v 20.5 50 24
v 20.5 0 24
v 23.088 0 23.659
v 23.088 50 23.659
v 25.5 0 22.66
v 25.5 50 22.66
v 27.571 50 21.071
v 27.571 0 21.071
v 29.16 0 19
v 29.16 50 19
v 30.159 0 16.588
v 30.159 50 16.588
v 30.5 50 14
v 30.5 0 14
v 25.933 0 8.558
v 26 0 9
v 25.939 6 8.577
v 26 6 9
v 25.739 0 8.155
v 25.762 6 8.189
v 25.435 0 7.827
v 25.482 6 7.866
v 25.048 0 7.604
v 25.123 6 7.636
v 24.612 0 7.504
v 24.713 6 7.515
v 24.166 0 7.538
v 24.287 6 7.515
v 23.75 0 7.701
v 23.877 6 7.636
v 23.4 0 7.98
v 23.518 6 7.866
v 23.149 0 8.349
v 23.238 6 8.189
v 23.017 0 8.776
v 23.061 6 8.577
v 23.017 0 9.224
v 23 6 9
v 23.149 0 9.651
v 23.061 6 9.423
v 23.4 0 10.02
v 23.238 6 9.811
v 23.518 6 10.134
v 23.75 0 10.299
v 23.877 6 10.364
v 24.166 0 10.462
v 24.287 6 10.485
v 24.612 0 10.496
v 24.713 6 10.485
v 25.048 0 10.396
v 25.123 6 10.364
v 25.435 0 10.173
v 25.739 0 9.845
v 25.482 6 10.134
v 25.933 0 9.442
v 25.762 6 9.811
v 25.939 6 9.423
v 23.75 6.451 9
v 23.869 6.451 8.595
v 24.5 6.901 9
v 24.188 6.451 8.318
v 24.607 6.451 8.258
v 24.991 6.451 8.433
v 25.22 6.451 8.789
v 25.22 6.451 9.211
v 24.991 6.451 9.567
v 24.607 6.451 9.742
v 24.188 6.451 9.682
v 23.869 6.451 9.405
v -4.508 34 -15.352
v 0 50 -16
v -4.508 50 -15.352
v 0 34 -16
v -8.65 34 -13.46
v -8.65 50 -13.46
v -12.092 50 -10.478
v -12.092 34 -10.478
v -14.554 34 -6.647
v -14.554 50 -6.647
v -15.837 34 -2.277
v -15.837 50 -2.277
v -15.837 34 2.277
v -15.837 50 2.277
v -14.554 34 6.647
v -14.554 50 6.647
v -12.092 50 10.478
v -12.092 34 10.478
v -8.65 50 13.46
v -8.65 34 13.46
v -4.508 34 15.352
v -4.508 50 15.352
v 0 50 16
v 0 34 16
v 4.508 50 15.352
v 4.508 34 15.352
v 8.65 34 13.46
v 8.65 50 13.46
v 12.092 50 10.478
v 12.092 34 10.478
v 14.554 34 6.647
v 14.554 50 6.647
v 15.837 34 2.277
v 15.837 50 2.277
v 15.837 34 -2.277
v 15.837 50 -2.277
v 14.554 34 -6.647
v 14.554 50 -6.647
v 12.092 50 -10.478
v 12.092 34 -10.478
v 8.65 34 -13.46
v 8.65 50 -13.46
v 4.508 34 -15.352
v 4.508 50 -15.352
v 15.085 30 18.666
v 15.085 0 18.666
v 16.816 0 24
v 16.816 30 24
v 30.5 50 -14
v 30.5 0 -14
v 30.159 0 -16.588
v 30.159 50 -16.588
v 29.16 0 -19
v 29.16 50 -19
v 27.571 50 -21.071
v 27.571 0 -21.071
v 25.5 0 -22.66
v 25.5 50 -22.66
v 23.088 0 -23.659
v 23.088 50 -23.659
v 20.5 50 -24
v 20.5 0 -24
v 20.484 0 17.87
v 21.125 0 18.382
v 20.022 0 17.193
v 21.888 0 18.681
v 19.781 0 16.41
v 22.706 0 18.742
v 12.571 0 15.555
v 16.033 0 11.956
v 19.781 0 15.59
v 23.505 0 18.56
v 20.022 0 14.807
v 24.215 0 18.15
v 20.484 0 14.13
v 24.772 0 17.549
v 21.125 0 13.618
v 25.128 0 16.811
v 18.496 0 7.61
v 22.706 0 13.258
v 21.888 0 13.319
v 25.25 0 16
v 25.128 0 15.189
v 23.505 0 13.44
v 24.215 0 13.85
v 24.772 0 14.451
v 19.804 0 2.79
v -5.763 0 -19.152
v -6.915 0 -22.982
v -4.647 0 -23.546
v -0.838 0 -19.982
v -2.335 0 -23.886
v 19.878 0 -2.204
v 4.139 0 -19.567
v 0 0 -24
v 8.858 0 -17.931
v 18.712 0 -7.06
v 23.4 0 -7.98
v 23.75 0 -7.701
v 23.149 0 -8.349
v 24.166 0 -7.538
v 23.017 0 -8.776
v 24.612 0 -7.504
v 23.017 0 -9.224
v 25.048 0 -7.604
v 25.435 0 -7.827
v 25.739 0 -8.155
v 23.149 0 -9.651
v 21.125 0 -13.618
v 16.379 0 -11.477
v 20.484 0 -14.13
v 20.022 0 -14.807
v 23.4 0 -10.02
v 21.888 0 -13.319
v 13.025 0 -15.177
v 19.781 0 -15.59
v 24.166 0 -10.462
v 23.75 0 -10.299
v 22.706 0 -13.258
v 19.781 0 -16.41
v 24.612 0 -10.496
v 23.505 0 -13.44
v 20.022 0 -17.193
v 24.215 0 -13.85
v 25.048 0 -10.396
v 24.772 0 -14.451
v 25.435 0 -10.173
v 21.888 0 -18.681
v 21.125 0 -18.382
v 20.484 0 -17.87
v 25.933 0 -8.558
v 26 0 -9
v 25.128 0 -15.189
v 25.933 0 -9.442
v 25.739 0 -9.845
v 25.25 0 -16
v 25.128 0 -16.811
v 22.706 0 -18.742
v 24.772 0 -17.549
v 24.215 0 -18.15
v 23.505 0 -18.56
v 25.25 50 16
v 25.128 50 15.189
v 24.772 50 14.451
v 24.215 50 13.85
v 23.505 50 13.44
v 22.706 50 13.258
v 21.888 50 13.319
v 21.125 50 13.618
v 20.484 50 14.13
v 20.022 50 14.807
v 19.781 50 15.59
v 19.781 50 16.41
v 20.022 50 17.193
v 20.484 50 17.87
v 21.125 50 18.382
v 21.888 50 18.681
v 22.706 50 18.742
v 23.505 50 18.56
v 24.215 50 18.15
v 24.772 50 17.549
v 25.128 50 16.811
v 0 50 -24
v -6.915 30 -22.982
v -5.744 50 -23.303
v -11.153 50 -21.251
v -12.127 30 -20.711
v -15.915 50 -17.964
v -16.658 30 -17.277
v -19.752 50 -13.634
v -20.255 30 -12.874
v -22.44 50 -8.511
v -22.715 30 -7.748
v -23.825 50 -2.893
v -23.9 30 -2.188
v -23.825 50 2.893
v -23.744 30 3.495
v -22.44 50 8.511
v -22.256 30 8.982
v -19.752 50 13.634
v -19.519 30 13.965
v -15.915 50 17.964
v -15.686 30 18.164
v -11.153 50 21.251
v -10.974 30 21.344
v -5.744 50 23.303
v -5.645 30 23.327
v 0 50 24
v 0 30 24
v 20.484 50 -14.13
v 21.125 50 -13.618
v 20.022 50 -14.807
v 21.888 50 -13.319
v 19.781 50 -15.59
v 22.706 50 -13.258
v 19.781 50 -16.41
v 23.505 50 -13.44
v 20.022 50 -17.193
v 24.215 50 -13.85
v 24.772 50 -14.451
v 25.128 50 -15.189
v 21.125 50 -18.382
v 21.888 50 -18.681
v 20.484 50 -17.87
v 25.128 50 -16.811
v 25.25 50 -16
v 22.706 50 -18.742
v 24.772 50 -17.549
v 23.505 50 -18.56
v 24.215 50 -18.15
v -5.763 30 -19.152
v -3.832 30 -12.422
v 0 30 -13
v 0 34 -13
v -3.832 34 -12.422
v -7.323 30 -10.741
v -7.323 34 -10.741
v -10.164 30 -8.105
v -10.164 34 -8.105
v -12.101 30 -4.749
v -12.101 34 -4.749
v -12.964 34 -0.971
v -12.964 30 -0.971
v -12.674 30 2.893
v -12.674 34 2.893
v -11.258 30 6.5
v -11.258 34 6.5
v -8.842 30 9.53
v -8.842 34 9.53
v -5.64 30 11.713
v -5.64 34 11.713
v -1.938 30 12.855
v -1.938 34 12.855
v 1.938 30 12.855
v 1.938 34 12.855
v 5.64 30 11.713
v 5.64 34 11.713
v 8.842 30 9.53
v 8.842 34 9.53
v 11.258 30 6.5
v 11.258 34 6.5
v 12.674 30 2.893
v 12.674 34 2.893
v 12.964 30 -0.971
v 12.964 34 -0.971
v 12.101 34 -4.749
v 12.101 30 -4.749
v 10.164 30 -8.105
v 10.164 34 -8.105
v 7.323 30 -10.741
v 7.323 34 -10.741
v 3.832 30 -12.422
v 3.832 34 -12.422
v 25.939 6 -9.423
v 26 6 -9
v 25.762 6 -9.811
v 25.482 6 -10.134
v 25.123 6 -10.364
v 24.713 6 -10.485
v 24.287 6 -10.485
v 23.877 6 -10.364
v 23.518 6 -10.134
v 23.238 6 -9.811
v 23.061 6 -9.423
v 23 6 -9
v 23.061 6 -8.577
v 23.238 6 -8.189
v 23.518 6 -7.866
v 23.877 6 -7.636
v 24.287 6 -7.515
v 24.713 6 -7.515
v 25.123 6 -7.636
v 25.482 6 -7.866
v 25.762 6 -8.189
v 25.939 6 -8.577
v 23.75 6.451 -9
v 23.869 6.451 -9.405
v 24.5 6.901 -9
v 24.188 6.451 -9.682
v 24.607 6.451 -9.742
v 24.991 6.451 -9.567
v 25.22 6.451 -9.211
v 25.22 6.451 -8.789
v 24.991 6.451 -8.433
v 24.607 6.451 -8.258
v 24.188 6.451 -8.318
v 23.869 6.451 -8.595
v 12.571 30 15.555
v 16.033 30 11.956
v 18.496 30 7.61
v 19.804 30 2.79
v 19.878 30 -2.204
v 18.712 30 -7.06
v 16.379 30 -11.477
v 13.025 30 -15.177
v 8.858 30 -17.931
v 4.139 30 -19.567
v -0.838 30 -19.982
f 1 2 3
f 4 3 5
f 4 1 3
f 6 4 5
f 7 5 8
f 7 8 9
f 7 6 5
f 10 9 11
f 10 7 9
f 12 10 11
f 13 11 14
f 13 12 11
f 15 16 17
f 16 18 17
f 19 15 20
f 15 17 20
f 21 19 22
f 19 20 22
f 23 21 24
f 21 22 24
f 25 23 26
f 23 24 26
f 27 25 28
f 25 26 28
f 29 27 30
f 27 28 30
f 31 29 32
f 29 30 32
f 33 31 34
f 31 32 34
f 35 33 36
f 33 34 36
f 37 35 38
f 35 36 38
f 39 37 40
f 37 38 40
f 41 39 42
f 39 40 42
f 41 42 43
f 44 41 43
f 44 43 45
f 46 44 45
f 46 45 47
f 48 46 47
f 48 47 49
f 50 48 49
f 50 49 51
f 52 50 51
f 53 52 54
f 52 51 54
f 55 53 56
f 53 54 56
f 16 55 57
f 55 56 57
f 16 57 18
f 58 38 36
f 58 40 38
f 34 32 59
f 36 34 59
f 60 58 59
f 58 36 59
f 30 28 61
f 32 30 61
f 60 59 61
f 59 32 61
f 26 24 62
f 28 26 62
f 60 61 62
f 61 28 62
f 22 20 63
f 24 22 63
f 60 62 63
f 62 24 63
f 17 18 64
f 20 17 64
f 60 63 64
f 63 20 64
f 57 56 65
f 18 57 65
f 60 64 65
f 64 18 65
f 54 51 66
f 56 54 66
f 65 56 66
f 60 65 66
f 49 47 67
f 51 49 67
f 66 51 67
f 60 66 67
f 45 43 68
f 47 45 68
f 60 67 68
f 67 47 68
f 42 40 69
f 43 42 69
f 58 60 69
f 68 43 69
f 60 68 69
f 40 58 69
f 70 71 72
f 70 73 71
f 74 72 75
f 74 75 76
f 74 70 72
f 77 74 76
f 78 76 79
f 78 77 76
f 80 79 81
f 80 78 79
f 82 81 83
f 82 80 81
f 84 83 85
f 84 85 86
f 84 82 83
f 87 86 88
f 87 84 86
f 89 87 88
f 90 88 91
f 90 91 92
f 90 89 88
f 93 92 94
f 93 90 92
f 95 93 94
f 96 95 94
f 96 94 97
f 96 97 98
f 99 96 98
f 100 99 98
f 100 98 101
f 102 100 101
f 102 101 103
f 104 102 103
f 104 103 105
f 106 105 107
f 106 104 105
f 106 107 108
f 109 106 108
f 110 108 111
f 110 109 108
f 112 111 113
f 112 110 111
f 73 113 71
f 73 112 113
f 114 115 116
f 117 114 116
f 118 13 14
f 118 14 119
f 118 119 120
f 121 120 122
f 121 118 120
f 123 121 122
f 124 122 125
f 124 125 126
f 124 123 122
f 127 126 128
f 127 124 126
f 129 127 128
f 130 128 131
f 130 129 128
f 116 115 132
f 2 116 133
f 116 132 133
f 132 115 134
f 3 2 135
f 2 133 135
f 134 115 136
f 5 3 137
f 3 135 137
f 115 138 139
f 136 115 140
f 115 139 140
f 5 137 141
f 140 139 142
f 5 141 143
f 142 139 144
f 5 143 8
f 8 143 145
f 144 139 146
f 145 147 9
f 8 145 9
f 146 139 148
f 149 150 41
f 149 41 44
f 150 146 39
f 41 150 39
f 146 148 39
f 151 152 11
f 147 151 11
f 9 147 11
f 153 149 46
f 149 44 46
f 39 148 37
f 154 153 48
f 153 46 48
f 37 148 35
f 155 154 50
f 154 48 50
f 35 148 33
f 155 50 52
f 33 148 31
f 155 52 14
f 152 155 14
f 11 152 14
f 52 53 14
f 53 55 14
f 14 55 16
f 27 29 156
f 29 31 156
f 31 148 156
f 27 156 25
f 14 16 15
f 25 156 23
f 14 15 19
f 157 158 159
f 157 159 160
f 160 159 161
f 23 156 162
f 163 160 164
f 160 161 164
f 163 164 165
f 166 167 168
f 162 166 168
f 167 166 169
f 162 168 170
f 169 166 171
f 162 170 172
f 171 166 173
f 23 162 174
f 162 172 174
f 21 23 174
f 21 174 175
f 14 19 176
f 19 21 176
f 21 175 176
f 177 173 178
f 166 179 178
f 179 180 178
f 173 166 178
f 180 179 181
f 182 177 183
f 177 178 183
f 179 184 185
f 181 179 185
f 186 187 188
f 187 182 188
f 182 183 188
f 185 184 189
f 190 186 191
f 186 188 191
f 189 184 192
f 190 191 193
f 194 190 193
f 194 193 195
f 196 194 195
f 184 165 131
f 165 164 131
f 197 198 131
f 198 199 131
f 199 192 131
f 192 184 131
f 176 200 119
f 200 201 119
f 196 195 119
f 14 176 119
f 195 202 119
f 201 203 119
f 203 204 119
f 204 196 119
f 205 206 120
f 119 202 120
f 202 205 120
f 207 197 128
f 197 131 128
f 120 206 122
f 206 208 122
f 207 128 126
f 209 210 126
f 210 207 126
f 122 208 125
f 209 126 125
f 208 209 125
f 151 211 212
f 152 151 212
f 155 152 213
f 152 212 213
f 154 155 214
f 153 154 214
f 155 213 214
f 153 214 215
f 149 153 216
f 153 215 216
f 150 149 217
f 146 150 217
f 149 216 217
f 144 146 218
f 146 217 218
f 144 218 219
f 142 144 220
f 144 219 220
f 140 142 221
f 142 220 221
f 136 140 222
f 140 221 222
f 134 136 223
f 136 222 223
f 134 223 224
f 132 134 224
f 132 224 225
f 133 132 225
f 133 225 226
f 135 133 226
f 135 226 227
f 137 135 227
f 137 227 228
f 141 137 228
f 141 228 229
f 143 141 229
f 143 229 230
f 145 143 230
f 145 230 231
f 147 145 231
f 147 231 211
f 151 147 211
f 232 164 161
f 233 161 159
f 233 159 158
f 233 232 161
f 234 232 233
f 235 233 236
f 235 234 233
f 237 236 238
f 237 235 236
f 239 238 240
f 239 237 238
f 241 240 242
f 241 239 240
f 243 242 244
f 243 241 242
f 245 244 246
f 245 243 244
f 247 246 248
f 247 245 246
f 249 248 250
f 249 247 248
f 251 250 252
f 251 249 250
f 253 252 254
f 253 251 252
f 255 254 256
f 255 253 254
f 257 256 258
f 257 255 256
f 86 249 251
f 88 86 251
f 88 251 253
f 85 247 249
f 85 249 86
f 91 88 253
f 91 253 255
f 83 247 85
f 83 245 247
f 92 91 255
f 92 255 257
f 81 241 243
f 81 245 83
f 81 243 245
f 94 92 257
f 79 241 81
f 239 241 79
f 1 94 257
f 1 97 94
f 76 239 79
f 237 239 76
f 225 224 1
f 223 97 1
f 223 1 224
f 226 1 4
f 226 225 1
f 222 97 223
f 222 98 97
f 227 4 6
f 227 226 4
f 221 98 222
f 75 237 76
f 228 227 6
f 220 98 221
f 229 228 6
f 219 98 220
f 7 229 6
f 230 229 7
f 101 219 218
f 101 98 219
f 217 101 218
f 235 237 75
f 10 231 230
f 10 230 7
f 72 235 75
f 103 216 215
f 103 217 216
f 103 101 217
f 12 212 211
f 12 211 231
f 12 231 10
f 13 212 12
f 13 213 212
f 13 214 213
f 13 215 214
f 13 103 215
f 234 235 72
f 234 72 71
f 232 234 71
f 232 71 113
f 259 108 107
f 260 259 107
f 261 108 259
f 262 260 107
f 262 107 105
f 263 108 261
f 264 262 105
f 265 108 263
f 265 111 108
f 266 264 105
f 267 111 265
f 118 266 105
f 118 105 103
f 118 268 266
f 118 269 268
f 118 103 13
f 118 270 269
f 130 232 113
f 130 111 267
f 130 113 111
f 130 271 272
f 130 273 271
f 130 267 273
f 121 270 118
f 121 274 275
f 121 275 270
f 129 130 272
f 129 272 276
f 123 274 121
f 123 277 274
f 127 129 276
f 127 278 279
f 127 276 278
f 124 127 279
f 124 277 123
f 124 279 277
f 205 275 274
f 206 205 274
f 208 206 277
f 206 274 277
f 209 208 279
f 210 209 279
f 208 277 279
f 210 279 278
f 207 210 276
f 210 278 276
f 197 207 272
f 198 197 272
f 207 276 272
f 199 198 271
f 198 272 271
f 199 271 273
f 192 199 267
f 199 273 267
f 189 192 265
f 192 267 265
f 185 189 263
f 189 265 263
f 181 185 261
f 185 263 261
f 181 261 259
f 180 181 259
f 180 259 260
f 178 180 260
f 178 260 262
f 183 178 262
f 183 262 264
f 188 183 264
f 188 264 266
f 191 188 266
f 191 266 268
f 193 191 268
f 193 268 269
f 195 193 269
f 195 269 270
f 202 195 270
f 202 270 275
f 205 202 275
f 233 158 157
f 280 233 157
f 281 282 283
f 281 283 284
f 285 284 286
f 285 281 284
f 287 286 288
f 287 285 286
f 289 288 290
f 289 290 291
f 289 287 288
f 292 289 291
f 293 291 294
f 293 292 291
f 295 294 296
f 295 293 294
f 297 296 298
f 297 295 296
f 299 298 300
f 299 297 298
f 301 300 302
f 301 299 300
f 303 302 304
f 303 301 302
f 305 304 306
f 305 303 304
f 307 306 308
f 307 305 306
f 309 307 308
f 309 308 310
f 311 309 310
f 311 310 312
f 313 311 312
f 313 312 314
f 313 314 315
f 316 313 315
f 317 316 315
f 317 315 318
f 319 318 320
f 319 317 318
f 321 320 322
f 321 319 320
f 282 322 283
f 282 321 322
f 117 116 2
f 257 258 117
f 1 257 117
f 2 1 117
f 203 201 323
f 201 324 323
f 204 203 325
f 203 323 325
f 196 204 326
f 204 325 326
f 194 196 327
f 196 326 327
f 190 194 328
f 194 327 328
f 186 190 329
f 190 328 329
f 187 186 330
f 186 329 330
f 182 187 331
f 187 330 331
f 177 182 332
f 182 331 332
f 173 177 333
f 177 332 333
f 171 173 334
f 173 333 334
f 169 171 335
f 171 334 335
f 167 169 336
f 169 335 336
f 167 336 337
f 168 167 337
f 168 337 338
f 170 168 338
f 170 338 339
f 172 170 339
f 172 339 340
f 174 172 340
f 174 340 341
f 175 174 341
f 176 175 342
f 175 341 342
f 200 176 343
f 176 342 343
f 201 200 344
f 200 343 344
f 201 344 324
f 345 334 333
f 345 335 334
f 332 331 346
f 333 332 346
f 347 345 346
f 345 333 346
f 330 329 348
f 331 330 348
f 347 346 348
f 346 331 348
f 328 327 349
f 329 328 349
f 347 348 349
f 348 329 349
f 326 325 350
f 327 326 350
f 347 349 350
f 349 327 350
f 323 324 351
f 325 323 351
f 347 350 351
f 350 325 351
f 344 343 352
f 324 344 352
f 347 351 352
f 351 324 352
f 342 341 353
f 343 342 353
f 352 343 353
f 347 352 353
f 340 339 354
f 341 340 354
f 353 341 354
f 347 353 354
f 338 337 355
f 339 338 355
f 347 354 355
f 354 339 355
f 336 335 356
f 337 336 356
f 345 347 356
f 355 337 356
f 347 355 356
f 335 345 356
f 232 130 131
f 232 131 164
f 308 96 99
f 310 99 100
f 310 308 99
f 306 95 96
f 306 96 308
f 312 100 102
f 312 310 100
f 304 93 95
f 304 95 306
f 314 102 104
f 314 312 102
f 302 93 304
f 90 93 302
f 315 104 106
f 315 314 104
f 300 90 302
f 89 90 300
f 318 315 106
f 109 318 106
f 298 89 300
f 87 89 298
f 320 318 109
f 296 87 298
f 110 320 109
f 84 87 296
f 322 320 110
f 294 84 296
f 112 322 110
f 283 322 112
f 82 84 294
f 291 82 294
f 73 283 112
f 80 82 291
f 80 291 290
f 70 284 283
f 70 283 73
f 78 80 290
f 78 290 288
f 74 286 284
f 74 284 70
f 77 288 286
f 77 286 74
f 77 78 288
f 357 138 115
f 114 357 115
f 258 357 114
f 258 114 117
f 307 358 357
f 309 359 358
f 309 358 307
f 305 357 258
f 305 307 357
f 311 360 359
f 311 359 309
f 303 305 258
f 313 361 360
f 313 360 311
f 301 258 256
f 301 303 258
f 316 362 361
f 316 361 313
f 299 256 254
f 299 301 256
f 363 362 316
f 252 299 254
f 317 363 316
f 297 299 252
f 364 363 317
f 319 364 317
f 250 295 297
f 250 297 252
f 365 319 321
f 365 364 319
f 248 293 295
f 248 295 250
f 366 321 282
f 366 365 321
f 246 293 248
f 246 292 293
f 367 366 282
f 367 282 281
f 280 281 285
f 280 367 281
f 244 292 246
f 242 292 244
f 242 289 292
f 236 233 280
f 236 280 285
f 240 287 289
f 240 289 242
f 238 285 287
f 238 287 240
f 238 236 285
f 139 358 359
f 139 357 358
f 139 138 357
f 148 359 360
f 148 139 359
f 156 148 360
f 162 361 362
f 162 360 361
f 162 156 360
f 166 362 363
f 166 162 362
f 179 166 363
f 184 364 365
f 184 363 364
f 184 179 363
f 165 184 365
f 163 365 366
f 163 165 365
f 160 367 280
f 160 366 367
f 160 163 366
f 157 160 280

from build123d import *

# Parameters (mm, degrees)
BOSS_EXTRUDE1_DEPTH       = 50
CUT_EXTRUDE1_DEPTH        = 30
F_3_0MM_DOWEL_HOLE1_D     = 3
F_3_0MM_DOWEL_HOLE1_DEPTH = 6
F_3_0MM_DOWEL_HOLE1_TIP   = 0.901290929
M5_CLEARANCE_HOLE1_D      = 5.5


with BuildPart() as part:
    # Sketch1 → Revolve1 (revolve)
    with BuildSketch(Plane.XY, mode=Mode.PRIVATE) as revolve1_sk:
        Polygon((-24, 0), (-24, 50), (-16, 50), (-16, 34), (-13, 34), (-13, 30), (-16, 30), (-20, 30), (-20, 0), align=None)
    revolve(revolve1_sk.sketch.rotate(Axis((0, 0, 0), (0, 1, 0)), 270), axis=Axis((0, 0, 0), (0, 1, 0)))

    # Sketch6 → Boss-Extrude1 (add)
    with BuildSketch(Plane(origin=(0, 50, 0), x_dir=(1, 0, 0), z_dir=(0, 1, 0))):
        with BuildLine():
            Line((0, -24), (20.5, -24))
            ThreePointArc((20.5, -24), (27.571067812, -21.071067812), (30.5, -14))
            Line((30.5, -14), (30.5, 14))
            ThreePointArc((30.5, 14), (27.571067812, 21.071067812), (20.5, 24))
            Line((20.5, 24), (0, 24))
            ThreePointArc((0, 24), (24, 0), (0, -24))
        make_face()
    extrude(amount=-BOSS_EXTRUDE1_DEPTH)

    # Sketch5 → Cut-Extrude1 (cut)
    with BuildSketch(Plane(origin=(0, 0, 0), x_dir=(1, 0, 0), z_dir=(0, 1, 0))):
        Polygon((15.085272612, -18.666401641), (20.483393436, -35.301209276), (-37.381072525, -18.770693037), (-37.381072525, 22.982117566), (-6.915364934, 22.982117566), (0, 0), align=None)
    extrude(amount=CUT_EXTRUDE1_DEPTH, mode=Mode.SUBTRACT)

    # Ø3.0mm Dowel Hole1
    with Locations(Plane(origin=(0, 0, 0), x_dir=(-1, 0, 0), z_dir=(0, -1, 0))):
        with Locations((-24.5, -9), (-24.5, 9)):
            Hole(F_3_0MM_DOWEL_HOLE1_D / 2, depth=F_3_0MM_DOWEL_HOLE1_DEPTH)
            with Locations((0, 0, -(F_3_0MM_DOWEL_HOLE1_DEPTH + F_3_0MM_DOWEL_HOLE1_TIP / 2))):  # 118° drill point
                Cone(0, F_3_0MM_DOWEL_HOLE1_D / 2, F_3_0MM_DOWEL_HOLE1_TIP, mode=Mode.SUBTRACT)

    # M5 Clearance Hole1 (through all)
    with Locations(Plane(origin=(0, 0, 0), x_dir=(-1, 0, 0), z_dir=(0, -1, 0))):
        with Locations((-22.5, -16), (-22.5, 16)):
            Hole(M5_CLEARANCE_HOLE1_D / 2)


solid = part.part
